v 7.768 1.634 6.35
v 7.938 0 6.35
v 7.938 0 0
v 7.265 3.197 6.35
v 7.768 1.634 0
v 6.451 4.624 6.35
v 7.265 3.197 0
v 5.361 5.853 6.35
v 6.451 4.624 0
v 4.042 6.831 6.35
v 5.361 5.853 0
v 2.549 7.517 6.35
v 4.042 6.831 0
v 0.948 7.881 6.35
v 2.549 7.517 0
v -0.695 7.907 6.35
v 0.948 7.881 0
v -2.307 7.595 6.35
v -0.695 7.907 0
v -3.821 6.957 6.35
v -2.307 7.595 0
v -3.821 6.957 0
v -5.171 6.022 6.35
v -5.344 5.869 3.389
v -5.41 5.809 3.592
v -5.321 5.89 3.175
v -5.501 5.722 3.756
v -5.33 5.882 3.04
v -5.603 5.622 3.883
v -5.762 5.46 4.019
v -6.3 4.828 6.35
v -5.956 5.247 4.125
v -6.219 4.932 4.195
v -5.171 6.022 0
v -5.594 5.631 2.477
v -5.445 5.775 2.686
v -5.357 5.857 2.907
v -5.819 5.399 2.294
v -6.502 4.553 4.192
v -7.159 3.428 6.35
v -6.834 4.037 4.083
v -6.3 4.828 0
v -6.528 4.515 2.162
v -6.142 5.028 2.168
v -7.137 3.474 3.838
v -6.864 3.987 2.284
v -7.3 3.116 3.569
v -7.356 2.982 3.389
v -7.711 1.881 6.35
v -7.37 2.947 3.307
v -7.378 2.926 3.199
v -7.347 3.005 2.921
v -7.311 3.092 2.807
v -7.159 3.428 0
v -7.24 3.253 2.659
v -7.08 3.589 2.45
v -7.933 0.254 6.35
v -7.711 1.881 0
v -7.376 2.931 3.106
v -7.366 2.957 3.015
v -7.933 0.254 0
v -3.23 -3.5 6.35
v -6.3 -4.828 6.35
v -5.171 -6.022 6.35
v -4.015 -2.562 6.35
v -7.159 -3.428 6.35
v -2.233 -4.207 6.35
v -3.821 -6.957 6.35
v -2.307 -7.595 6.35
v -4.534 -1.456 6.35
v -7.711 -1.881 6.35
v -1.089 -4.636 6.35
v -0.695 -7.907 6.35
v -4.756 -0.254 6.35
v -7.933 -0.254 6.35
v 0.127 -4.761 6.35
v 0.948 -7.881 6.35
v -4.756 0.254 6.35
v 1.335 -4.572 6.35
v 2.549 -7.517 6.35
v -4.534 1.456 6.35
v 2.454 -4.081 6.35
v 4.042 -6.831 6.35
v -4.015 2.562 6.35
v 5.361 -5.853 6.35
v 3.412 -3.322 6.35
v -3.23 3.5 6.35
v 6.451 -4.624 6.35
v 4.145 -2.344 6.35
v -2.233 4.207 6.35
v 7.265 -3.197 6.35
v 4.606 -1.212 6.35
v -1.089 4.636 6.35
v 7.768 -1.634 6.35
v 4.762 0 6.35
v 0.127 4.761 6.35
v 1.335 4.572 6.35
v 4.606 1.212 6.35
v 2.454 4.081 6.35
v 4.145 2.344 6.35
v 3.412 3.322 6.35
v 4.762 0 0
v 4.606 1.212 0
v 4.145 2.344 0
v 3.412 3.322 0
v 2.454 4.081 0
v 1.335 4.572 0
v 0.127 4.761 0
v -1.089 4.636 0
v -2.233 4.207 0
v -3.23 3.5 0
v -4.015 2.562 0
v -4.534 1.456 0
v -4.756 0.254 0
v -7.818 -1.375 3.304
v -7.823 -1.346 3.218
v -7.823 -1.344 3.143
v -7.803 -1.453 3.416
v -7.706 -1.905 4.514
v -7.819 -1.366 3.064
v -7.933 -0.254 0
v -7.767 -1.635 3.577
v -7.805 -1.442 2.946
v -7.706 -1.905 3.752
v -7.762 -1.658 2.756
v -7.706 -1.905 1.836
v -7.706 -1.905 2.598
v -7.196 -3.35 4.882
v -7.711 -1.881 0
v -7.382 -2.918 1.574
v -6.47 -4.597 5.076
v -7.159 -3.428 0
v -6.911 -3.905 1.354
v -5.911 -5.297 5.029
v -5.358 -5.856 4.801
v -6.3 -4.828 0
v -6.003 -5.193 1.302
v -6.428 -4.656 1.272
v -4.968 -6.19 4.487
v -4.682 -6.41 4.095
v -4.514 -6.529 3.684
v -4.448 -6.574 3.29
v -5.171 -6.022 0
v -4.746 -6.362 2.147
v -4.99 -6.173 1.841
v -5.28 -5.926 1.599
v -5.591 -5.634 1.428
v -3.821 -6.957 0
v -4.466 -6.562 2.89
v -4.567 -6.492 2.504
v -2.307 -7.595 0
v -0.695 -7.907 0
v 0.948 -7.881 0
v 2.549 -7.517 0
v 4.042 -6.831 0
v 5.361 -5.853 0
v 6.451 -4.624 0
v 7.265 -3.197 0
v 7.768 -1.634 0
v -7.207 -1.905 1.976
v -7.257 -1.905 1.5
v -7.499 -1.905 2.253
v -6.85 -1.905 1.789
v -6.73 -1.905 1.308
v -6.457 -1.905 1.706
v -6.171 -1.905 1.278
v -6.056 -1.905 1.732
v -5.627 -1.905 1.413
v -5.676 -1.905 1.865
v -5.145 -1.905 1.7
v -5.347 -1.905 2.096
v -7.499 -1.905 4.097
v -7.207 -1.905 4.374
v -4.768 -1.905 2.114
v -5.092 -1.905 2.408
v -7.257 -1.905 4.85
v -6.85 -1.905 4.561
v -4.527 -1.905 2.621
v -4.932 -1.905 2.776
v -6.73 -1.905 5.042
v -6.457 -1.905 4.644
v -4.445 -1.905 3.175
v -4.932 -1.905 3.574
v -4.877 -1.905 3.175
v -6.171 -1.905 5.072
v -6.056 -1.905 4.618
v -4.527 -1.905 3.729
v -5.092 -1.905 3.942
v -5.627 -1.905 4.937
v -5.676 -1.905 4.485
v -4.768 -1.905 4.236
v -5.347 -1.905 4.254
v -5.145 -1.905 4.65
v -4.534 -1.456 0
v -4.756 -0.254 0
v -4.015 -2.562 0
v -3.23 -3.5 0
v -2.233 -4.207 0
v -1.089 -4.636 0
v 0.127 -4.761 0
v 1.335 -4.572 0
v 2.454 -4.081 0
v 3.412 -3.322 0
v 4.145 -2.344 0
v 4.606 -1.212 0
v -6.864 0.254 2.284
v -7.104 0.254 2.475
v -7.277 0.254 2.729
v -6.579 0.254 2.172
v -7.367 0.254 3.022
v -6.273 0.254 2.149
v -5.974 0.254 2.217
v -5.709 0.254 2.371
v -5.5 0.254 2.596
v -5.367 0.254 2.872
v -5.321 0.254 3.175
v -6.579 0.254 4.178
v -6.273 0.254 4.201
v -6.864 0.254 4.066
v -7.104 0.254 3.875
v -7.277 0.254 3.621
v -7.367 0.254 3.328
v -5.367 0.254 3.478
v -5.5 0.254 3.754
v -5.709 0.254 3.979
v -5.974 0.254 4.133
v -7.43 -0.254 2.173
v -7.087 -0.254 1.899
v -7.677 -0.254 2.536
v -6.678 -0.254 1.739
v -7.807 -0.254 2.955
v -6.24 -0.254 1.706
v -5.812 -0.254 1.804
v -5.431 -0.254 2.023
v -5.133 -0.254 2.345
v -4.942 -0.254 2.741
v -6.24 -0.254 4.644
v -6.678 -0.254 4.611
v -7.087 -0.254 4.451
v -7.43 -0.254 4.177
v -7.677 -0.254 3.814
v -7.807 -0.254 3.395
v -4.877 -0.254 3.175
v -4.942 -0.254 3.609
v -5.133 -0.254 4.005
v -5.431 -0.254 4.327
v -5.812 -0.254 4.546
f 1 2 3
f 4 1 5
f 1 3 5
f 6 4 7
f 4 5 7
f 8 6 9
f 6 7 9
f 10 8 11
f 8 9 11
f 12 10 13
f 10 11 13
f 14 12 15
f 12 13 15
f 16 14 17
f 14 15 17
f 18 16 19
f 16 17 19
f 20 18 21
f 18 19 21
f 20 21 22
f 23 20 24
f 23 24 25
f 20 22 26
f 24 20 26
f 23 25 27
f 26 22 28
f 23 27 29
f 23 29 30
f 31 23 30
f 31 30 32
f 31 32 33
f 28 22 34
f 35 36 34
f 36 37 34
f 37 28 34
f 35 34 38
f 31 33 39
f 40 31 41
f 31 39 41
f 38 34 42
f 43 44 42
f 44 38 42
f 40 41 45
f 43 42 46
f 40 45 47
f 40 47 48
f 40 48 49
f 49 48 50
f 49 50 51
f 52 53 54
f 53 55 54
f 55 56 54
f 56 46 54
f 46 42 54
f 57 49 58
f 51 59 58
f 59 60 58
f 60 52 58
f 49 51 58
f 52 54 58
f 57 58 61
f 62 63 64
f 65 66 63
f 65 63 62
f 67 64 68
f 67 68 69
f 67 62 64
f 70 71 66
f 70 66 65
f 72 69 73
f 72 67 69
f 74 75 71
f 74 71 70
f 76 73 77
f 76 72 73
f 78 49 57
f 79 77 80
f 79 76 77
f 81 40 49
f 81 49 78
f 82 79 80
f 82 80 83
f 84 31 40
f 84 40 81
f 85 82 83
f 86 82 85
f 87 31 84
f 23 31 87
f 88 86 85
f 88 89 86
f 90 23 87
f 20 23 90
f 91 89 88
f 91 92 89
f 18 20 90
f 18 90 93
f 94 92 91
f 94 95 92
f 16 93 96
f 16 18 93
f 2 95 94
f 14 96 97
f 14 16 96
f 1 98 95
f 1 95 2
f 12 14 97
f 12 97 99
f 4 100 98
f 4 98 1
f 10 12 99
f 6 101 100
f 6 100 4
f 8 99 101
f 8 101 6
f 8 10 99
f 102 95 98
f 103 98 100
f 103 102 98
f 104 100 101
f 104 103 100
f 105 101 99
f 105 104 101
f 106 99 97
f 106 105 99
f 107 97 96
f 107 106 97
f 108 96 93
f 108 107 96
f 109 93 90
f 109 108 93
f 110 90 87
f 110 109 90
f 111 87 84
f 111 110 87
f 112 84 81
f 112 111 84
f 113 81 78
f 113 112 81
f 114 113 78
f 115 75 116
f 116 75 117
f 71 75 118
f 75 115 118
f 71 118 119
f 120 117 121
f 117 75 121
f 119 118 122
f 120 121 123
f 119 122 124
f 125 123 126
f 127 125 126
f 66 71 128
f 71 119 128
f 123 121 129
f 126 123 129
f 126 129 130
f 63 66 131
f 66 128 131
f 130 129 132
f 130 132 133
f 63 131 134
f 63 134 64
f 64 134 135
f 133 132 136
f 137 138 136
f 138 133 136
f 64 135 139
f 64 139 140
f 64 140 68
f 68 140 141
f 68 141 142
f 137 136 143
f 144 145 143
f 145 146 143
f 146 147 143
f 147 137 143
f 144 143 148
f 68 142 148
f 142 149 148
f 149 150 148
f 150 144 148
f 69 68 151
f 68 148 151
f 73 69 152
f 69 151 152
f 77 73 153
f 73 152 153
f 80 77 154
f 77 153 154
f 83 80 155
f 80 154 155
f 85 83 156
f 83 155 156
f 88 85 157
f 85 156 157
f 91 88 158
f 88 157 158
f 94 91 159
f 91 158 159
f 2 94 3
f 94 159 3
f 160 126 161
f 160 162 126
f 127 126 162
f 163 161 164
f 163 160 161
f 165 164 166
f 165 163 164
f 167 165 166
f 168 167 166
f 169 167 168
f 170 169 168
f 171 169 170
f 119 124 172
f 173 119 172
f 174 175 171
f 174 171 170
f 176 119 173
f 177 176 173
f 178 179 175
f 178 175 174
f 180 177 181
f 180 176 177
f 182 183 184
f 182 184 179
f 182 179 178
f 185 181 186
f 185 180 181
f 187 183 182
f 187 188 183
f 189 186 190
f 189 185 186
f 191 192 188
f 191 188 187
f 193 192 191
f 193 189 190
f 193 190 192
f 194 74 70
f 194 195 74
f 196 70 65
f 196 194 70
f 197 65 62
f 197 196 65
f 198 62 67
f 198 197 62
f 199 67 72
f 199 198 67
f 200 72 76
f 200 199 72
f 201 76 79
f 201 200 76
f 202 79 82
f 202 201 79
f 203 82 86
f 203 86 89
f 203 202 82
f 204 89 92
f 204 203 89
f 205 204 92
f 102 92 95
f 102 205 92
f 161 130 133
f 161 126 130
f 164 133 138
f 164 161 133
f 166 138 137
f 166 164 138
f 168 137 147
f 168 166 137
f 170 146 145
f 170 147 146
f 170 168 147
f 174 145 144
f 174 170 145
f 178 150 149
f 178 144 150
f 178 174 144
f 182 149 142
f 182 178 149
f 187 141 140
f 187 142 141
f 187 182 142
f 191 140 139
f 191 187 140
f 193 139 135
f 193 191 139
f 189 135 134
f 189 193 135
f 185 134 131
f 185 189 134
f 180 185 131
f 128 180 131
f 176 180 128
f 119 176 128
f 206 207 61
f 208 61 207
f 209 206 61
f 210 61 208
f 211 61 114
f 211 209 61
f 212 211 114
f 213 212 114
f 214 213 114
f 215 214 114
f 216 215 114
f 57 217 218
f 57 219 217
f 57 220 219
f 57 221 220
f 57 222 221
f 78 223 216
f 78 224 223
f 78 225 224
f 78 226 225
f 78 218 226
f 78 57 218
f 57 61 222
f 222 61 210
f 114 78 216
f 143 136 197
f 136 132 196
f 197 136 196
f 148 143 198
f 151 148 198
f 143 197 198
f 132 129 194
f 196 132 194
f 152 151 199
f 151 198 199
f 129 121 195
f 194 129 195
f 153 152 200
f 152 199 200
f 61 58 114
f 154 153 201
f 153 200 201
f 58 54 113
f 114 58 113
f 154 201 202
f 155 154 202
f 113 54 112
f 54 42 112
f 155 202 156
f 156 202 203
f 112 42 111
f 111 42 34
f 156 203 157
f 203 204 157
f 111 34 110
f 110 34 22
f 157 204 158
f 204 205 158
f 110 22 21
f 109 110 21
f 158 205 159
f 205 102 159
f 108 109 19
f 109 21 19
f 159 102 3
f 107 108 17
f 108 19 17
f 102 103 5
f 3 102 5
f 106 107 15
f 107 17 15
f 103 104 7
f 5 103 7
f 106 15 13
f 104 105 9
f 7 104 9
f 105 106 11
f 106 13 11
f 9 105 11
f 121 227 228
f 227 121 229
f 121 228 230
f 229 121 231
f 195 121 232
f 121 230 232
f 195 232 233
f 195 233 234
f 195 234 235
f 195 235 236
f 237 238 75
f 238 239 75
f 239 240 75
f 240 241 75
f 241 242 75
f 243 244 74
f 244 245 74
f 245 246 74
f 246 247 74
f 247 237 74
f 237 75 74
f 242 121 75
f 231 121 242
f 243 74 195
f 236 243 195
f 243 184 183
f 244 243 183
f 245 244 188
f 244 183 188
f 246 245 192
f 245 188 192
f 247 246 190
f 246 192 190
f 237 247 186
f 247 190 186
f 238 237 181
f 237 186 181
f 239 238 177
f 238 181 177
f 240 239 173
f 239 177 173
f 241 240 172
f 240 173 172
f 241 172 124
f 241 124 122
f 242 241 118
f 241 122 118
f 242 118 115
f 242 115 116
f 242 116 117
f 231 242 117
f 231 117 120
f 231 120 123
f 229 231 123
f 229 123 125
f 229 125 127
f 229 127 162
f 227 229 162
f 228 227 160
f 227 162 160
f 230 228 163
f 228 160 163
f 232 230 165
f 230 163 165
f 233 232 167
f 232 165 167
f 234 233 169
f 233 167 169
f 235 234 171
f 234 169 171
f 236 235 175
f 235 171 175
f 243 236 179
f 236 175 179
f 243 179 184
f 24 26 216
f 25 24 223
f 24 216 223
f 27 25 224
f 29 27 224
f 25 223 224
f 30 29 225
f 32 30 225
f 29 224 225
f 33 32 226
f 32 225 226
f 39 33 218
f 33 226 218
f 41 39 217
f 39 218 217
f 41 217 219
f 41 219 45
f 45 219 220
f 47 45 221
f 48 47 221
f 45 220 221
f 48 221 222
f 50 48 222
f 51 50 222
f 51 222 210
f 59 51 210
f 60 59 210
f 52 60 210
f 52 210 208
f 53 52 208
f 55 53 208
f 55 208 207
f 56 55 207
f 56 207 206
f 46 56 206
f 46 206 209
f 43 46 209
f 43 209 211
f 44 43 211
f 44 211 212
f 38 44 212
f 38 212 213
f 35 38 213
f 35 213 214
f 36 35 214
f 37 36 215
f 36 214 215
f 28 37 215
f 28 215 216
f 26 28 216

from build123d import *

# Parameters (mm, degrees)
F0_R     = 7.9375
F0_R_2   = 4.7625
F1_DEPTH = 6.35
F3_R     = 1.905
F4_DEPTH = 25.4
F5_W     = 3.218135
F5_H     = 6.369046
F6_DEPTH = 0.254
F7_R     = 1.0287
F8_DEPTH = 25.4
F7_R_2   = 1.4732
F9_DEPTH = 1.778


with BuildPart() as f1:
    # F0 (on Top) → F1 (new body)
    with BuildSketch(Plane.XY):
        Circle(F0_R)
        Circle(F0_R_2, mode=Mode.SUBTRACT)
    extrude(amount=F1_DEPTH)

    # F3 (on offset) → F4 (cut)
    with BuildSketch(Plane.XZ.offset(1.905)):
        with Locations((-6.35, 3.175)):
            Circle(F3_R)
    extrude(amount=F4_DEPTH, mode=Mode.SUBTRACT)

    # F5 (on Front) → F6 (cut, symmetric)
    with BuildSketch(Plane.XZ):
        with Locations((-6.336745, 3.184523)):
            Rectangle(F5_W, F5_H)
    extrude(amount=F6_DEPTH, both=True, mode=Mode.SUBTRACT)

    # F7 (on face) → F8 (cut)
    with BuildSketch(Plane.XZ.offset(1.905)):
        with Locations((-6.35, 3.175)):
            Circle(F7_R)
    extrude(amount=-F8_DEPTH, mode=Mode.SUBTRACT)

    # F7 (on face) → F9 (cut)
    with BuildSketch(Plane.XZ.offset(1.905)):
        with Locations((-6.35, 3.175)):
            Circle(F7_R_2)
        with Locations((-6.35, 3.175)):
            Circle(F7_R, mode=Mode.SUBTRACT)
    extrude(amount=-F9_DEPTH, mode=Mode.SUBTRACT)


solid = f1.part
